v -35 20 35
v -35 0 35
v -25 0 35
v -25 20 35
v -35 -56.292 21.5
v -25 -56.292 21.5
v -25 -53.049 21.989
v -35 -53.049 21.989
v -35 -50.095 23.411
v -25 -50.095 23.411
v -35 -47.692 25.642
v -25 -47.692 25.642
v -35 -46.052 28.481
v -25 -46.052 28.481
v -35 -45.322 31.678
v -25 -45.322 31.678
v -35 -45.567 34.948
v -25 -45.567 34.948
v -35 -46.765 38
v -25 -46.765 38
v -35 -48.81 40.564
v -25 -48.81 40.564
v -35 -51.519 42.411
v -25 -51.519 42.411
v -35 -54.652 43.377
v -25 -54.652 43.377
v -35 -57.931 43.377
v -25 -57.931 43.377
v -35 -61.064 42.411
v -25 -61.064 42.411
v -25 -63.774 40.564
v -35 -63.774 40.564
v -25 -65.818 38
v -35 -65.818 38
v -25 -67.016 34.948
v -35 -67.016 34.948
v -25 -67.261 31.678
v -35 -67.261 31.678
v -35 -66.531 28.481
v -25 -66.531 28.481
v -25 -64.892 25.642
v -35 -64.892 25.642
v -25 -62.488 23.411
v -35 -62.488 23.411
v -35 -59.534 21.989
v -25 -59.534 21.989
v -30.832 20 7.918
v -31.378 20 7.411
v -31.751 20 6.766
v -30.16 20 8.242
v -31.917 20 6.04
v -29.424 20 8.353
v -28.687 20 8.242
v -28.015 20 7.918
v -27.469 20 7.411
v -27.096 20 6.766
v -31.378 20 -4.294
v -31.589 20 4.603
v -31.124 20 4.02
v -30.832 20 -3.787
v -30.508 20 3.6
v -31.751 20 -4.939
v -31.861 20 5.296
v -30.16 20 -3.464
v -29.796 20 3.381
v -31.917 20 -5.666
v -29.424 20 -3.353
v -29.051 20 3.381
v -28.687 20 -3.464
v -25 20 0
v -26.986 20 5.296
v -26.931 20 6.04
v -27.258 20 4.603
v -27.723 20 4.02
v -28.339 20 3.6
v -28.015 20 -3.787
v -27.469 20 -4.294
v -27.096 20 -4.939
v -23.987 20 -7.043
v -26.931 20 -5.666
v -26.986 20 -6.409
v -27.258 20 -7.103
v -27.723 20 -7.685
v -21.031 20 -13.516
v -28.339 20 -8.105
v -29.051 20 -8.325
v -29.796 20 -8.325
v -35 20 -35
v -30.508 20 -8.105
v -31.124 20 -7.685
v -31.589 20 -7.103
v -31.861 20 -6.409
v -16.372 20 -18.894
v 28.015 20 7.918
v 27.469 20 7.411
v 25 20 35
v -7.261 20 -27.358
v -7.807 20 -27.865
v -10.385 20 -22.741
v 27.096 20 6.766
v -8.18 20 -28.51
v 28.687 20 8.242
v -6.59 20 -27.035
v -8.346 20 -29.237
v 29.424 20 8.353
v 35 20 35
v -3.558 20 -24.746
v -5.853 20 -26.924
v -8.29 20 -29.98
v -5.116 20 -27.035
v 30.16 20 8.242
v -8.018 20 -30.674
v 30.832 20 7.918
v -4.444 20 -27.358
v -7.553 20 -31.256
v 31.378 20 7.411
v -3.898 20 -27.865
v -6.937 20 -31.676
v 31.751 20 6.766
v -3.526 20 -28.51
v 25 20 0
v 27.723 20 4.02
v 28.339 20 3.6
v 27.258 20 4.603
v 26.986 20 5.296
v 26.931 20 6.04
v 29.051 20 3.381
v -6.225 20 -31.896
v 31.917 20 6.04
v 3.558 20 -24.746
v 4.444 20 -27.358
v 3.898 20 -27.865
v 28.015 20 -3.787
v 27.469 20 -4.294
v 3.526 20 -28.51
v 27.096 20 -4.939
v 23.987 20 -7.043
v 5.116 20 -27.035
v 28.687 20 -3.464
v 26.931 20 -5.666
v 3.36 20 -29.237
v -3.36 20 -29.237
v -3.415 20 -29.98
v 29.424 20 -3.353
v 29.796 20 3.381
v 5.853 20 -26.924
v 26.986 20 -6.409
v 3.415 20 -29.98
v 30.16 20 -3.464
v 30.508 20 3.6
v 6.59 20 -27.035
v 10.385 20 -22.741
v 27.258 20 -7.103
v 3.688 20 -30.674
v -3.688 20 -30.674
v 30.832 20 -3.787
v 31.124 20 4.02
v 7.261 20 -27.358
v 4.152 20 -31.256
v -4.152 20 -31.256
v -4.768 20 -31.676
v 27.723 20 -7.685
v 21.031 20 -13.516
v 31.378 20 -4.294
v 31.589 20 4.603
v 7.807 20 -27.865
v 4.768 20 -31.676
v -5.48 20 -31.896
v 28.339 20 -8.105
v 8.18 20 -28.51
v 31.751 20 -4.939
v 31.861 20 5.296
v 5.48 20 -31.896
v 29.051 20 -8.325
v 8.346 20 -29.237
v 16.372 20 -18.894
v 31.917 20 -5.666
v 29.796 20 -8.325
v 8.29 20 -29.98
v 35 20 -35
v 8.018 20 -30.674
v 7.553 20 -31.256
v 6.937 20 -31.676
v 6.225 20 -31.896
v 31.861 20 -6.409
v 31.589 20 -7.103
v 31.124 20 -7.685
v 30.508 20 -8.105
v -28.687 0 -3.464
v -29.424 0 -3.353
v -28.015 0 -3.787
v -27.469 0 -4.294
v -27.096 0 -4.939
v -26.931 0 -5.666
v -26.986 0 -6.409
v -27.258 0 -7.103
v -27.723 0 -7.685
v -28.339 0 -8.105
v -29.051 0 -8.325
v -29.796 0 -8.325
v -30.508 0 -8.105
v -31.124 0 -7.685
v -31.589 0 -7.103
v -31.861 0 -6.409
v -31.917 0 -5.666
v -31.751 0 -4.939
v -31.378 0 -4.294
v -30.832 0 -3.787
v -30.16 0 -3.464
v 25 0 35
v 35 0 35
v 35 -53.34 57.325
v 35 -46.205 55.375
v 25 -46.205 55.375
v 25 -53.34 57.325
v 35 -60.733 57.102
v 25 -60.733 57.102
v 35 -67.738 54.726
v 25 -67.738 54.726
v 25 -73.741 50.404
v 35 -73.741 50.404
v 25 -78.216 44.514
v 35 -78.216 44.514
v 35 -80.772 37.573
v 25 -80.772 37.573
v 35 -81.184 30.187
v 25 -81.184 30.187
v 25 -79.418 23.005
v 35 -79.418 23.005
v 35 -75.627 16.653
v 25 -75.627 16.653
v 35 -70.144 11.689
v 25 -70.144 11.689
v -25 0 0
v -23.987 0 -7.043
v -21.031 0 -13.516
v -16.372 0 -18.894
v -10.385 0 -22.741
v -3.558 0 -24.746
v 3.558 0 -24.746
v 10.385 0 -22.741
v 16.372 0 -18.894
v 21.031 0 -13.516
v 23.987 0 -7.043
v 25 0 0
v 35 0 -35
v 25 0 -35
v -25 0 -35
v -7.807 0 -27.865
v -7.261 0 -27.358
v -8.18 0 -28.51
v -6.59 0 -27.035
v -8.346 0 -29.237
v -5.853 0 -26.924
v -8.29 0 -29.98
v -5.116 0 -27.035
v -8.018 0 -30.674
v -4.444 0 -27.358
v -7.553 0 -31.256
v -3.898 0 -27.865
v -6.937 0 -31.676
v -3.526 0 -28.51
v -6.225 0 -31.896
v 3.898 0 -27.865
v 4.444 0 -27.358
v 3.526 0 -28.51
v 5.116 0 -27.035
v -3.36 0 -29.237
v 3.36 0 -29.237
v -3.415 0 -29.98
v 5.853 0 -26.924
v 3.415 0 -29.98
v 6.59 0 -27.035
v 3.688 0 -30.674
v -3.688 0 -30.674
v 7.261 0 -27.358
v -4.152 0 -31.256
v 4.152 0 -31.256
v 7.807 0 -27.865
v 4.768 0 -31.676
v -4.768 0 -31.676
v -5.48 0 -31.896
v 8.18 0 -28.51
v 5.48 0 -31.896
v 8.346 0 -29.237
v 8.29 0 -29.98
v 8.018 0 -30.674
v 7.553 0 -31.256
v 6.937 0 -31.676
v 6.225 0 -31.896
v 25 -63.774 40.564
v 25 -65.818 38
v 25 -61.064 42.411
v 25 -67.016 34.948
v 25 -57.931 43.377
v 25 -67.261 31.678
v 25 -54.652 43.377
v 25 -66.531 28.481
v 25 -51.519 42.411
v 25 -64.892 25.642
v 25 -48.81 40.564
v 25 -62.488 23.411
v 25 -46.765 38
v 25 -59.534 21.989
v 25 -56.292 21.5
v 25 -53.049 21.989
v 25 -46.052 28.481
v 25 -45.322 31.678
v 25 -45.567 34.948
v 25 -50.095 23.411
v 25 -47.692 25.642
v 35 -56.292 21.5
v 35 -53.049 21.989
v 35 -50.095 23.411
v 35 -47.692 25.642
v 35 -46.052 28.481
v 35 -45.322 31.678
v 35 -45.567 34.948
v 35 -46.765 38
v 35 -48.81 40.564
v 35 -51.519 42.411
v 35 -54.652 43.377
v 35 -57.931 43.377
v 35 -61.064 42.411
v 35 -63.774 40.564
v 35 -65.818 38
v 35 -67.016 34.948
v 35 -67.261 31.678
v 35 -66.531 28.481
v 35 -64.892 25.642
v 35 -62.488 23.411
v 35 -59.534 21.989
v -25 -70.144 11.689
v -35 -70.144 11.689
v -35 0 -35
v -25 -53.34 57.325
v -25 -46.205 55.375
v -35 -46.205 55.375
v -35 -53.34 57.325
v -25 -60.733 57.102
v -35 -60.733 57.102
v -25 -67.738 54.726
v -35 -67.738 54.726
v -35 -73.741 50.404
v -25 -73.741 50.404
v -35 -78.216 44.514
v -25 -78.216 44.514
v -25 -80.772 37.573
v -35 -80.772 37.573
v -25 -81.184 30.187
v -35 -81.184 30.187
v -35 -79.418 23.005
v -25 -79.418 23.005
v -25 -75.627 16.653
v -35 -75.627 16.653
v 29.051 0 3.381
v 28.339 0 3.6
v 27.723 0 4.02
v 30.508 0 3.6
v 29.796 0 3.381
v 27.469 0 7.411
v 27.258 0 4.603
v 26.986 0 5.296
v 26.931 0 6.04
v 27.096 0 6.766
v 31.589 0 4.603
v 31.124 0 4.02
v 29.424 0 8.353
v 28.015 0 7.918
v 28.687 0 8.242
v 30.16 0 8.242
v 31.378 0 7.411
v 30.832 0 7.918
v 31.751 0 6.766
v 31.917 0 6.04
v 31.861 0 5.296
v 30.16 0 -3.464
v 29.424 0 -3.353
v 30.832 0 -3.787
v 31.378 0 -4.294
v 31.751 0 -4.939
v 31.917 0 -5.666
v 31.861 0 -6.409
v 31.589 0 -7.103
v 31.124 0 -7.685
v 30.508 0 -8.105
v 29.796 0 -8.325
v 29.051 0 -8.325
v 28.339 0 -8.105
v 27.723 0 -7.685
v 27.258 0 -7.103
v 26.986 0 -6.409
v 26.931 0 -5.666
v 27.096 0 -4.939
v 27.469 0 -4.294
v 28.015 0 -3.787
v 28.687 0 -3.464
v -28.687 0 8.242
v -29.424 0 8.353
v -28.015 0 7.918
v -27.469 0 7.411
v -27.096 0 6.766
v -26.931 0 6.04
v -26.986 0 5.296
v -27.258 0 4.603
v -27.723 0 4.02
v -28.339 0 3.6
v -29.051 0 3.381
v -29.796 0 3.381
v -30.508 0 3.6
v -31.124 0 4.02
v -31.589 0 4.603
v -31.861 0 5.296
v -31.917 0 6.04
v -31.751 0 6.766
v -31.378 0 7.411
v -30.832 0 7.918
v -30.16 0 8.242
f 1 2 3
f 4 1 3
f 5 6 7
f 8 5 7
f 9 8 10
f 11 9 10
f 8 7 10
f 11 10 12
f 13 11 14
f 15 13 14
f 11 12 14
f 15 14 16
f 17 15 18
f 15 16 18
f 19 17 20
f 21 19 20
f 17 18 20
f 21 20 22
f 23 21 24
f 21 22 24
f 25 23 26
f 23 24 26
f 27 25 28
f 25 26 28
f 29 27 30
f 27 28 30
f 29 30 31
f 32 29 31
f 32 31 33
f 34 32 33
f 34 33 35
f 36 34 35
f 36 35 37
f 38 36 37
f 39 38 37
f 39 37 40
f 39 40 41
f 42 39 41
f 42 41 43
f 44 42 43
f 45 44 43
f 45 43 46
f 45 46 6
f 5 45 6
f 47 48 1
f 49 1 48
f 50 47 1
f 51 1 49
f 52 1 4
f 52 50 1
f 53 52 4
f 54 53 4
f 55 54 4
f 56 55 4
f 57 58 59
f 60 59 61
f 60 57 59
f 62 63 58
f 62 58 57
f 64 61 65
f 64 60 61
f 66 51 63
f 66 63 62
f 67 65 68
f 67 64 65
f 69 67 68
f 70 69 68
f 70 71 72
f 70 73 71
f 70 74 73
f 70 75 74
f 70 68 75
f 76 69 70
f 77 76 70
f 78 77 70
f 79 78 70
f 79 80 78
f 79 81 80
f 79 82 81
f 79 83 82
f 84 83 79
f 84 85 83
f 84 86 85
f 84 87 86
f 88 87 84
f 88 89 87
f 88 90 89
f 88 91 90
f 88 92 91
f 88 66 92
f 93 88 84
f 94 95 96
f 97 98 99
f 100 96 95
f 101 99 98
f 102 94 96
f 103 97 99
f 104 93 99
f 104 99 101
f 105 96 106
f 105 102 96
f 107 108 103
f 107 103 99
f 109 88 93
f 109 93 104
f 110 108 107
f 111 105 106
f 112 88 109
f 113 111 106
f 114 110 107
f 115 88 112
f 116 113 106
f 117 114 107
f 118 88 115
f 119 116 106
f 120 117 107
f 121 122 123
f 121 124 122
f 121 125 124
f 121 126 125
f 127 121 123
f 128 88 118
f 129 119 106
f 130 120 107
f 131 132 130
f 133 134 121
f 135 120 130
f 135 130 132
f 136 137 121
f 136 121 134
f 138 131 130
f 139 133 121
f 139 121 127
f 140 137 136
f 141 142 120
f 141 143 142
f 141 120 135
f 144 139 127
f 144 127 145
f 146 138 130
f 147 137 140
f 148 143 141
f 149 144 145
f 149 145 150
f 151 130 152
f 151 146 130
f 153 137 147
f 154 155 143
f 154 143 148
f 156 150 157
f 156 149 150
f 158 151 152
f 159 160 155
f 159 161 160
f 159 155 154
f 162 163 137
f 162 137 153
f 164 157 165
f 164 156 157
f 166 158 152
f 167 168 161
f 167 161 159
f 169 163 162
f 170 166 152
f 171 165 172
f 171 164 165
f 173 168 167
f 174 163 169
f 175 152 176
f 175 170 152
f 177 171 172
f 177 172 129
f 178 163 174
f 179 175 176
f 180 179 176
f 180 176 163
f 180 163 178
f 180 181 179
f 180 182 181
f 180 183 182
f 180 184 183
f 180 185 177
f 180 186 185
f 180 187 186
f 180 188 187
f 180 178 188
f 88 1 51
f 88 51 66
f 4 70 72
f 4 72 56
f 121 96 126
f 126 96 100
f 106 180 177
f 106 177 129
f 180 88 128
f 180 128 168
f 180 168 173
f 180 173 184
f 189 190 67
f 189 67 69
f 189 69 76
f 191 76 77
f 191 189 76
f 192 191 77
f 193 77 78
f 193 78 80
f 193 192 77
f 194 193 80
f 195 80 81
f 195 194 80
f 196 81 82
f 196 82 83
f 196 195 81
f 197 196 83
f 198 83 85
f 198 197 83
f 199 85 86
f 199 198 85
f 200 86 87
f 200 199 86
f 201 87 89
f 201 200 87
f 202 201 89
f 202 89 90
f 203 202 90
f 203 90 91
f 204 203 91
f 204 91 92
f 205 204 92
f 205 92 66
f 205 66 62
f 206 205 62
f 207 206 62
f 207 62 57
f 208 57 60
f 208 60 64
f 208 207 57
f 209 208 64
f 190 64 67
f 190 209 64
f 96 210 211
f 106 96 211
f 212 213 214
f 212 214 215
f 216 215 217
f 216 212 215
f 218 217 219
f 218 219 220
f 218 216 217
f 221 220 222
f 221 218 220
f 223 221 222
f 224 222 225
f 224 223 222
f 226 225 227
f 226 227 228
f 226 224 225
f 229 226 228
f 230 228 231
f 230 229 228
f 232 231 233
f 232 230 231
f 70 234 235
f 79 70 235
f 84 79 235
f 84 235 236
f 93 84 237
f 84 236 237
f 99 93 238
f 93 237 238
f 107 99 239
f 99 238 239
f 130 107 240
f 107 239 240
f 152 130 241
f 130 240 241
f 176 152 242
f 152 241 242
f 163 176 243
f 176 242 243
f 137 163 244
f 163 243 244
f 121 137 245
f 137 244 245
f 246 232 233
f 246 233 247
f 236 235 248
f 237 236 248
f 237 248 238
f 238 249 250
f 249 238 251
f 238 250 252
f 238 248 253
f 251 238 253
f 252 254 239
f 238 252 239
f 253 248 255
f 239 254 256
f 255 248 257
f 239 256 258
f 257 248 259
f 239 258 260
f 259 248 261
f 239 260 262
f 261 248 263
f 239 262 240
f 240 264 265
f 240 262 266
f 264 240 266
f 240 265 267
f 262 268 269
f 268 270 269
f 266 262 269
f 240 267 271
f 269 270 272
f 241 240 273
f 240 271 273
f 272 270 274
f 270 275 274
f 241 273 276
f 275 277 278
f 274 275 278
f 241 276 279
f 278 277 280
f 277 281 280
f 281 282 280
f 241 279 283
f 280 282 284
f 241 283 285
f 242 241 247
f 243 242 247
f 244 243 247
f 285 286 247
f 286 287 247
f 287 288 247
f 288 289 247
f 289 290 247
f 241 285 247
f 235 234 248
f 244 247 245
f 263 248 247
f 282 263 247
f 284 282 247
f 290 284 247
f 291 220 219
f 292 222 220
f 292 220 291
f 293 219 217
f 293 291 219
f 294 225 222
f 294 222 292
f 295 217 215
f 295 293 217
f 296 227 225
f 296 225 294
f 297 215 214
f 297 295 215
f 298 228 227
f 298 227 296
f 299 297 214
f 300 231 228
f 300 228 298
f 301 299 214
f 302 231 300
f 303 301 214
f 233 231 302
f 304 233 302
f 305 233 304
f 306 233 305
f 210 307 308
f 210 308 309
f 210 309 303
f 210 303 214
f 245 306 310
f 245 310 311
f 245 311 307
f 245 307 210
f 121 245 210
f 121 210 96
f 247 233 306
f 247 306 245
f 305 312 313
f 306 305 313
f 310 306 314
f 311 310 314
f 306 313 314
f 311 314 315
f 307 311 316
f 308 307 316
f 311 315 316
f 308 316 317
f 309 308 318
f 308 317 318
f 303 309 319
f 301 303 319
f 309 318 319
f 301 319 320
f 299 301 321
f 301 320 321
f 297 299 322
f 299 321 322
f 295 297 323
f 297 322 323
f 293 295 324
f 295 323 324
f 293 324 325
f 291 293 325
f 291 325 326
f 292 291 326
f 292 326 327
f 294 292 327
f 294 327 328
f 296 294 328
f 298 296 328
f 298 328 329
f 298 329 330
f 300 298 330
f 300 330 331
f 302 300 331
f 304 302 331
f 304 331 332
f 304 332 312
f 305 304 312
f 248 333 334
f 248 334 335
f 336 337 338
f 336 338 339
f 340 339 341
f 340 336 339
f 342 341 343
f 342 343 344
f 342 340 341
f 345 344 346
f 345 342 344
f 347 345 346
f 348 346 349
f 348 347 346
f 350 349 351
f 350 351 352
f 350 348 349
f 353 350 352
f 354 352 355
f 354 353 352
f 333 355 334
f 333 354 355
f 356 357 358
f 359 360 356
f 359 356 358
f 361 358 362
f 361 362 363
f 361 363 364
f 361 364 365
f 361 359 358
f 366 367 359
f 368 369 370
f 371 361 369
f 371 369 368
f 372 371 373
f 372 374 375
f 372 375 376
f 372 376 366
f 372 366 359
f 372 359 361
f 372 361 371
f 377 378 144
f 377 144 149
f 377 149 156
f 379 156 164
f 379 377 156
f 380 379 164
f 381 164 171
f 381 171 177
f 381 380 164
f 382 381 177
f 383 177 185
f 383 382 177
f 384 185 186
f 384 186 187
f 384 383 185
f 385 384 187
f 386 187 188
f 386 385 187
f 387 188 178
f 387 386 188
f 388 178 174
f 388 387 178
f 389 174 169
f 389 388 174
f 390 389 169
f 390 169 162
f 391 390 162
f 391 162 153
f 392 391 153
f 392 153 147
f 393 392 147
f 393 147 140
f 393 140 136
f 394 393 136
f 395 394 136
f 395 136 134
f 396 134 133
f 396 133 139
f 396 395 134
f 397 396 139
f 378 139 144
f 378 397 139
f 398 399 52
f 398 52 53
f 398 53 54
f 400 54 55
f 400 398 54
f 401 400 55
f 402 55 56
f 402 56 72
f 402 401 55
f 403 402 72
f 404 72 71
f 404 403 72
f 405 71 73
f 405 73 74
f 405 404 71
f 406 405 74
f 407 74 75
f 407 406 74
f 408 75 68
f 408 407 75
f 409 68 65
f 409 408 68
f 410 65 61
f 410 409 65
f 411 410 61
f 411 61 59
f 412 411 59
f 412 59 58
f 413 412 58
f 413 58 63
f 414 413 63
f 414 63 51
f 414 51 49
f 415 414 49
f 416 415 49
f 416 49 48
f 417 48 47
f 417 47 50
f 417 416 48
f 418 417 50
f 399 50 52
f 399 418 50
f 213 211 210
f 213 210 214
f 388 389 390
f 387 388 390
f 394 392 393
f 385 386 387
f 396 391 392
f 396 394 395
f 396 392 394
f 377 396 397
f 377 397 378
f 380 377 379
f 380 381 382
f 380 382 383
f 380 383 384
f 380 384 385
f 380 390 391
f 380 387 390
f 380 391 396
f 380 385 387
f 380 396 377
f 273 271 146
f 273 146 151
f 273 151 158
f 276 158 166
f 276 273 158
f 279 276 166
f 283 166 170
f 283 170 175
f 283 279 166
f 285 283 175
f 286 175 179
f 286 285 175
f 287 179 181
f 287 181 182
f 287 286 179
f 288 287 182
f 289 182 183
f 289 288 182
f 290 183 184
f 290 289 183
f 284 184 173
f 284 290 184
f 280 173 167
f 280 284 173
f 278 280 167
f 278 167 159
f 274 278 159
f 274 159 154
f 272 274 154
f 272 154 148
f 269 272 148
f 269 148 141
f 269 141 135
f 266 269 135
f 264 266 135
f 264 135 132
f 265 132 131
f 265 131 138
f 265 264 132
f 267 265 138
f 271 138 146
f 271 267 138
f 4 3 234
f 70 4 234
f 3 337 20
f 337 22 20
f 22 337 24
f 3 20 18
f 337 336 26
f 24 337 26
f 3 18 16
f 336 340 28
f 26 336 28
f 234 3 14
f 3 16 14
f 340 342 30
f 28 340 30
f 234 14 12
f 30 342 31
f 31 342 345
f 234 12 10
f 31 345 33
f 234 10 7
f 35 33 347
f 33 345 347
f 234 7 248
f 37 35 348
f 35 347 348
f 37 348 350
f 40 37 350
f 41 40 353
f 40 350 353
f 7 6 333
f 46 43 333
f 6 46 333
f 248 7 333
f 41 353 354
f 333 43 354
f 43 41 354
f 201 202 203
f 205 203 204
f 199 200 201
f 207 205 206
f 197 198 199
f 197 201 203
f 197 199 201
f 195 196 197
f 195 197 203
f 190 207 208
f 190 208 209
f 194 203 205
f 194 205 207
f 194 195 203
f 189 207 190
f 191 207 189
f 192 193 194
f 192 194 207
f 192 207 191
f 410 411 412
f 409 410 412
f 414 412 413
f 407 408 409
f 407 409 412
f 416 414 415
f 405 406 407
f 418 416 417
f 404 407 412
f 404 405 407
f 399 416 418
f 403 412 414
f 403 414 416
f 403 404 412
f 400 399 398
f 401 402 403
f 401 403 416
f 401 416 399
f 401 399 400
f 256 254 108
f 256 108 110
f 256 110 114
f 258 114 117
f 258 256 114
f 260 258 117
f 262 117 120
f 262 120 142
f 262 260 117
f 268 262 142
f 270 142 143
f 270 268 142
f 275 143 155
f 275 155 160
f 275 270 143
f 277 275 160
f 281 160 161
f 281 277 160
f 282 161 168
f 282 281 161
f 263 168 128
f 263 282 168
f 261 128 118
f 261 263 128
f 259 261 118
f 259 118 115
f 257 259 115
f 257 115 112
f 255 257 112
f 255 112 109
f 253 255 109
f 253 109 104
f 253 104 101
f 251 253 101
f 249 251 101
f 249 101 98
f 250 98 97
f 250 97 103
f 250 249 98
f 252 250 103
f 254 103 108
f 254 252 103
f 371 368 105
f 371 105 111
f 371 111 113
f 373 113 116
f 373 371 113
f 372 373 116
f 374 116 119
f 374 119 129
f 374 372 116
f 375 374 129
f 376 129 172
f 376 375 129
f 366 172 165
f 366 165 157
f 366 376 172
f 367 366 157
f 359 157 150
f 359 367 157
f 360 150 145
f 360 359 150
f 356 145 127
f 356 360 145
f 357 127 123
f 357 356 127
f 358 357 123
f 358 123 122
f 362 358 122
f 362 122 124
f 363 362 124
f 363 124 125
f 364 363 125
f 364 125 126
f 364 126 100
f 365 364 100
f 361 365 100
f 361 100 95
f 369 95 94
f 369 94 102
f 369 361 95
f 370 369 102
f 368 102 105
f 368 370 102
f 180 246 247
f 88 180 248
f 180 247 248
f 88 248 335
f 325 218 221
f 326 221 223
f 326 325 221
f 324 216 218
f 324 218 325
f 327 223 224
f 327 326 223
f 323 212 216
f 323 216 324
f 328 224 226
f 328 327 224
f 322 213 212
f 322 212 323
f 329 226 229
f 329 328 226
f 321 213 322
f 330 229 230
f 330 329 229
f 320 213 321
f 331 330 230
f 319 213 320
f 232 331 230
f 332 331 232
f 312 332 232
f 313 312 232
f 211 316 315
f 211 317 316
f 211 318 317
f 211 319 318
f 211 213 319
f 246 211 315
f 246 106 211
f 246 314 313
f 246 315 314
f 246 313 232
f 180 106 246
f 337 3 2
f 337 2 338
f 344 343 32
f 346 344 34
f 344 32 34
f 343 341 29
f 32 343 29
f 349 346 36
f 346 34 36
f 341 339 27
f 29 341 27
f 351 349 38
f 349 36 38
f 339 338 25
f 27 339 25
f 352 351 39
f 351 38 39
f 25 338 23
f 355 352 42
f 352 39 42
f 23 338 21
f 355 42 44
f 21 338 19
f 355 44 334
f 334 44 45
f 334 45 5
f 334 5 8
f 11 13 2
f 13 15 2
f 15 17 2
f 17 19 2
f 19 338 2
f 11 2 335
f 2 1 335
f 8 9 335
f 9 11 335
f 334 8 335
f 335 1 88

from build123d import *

# Parameters (mm, degrees)
SKETCH1_R               = 2.5
BOSS_EXTRUDE1_DEPTH     = 20
SKETCH7_R               = 25
SKETCH7_R_2             = 11
BOSS_EXTRUDE3_DEPTH     = 70
CUT_EXTRUDE8_DEPTH      = 102
CUT_EXTRUDE8_DEPTH_BACK = 102
SKETCH9_W               = 50
SKETCH9_H               = 83.625795222


with BuildPart() as part:
    # Sketch1 → Boss-Extrude1 (new body)
    with BuildSketch(Plane(origin=(0, 0, 0), x_dir=(1, 0, 0), z_dir=(0, 1, 0))):
        with BuildLine():
            Line((-35, 35), (-35, -35))
            Line((-35, -35), (-25, -35))
            Line((-25, -35), (-25, 0))
            ThreePointArc((-25, 0), (0, 25), (25, 0))
            Line((25, 0), (25, -35))
            Line((25, -35), (35, -35))
            Line((35, -35), (35, 35))
            Line((35, 35), (-35, 35))
        make_face()
        with Locations(Location((-29.423558412, -5.85270966, 0), (0, 0, 270))):
            Circle(SKETCH1_R, mode=Mode.SUBTRACT)
        with Locations(Location((29.423558412, -5.85270966, 0), (0, 0, 270))):
            Circle(SKETCH1_R, mode=Mode.SUBTRACT)
        with Locations(Location((-29.423558412, 5.85270966, 0), (0, 0, 270))):
            Circle(SKETCH1_R, mode=Mode.SUBTRACT)
        with Locations(Location((-5.85270966, 29.423558412, 0), (0, 0, 270))):
            Circle(SKETCH1_R, mode=Mode.SUBTRACT)
        with Locations(Location((29.423558412, 5.85270966, 0), (0, 0, 270))):
            Circle(SKETCH1_R, mode=Mode.SUBTRACT)
        with Locations(Location((5.85270966, 29.423558412, 0), (0, 0, 270))):
            Circle(SKETCH1_R, mode=Mode.SUBTRACT)
    extrude(amount=BOSS_EXTRUDE1_DEPTH)

    # Sketch7 → Boss-Extrude3 (add)
    # profile 1 of 2: a face of its own
    with BuildSketch(Plane(origin=(35, 0, 0), x_dir=(0, 0, -1), z_dir=(1, 0, 0))):
        with BuildLine():
            Line((-35, 0), (-55.374716919, -46.204663298))
            ThreePointArc((-55.374716919, -46.204663298), (-27.345774694, -31.828741331), (-7.5, -56.291651246))
            ThreePointArc((-7.5, -56.291651246), (-8.570053321, -63.527510003), (-11.688612156, -70.143948384))
            Line((-11.688612156, -70.143948384), (35, 0))
            Line((35, 0), (-35, 0))
        make_face()
    # profile 2 of 2: a face of its own
    with BuildSketch(Plane(origin=(35, 0, 0), x_dir=(0, 0, -1), z_dir=(1, 0, 0))):
        with Locations((-32.5, -56.291651246)):
            Circle(SKETCH7_R)
        with Locations((-32.5, -56.291651246)):
            Circle(SKETCH7_R_2, mode=Mode.SUBTRACT)
    extrude(amount=-BOSS_EXTRUDE3_DEPTH)

    # Sketch9 → Cut-Extrude8 (cut, two sides: drawn at the far end of the back side and taken through both)
    with BuildSketch(Plane.XY.offset(-CUT_EXTRUDE8_DEPTH_BACK)):
        with Locations((0, -41.812897611)):
            Rectangle(SKETCH9_W, SKETCH9_H)
    extrude(amount=CUT_EXTRUDE8_DEPTH + CUT_EXTRUDE8_DEPTH_BACK, mode=Mode.SUBTRACT)


solid = part.part
